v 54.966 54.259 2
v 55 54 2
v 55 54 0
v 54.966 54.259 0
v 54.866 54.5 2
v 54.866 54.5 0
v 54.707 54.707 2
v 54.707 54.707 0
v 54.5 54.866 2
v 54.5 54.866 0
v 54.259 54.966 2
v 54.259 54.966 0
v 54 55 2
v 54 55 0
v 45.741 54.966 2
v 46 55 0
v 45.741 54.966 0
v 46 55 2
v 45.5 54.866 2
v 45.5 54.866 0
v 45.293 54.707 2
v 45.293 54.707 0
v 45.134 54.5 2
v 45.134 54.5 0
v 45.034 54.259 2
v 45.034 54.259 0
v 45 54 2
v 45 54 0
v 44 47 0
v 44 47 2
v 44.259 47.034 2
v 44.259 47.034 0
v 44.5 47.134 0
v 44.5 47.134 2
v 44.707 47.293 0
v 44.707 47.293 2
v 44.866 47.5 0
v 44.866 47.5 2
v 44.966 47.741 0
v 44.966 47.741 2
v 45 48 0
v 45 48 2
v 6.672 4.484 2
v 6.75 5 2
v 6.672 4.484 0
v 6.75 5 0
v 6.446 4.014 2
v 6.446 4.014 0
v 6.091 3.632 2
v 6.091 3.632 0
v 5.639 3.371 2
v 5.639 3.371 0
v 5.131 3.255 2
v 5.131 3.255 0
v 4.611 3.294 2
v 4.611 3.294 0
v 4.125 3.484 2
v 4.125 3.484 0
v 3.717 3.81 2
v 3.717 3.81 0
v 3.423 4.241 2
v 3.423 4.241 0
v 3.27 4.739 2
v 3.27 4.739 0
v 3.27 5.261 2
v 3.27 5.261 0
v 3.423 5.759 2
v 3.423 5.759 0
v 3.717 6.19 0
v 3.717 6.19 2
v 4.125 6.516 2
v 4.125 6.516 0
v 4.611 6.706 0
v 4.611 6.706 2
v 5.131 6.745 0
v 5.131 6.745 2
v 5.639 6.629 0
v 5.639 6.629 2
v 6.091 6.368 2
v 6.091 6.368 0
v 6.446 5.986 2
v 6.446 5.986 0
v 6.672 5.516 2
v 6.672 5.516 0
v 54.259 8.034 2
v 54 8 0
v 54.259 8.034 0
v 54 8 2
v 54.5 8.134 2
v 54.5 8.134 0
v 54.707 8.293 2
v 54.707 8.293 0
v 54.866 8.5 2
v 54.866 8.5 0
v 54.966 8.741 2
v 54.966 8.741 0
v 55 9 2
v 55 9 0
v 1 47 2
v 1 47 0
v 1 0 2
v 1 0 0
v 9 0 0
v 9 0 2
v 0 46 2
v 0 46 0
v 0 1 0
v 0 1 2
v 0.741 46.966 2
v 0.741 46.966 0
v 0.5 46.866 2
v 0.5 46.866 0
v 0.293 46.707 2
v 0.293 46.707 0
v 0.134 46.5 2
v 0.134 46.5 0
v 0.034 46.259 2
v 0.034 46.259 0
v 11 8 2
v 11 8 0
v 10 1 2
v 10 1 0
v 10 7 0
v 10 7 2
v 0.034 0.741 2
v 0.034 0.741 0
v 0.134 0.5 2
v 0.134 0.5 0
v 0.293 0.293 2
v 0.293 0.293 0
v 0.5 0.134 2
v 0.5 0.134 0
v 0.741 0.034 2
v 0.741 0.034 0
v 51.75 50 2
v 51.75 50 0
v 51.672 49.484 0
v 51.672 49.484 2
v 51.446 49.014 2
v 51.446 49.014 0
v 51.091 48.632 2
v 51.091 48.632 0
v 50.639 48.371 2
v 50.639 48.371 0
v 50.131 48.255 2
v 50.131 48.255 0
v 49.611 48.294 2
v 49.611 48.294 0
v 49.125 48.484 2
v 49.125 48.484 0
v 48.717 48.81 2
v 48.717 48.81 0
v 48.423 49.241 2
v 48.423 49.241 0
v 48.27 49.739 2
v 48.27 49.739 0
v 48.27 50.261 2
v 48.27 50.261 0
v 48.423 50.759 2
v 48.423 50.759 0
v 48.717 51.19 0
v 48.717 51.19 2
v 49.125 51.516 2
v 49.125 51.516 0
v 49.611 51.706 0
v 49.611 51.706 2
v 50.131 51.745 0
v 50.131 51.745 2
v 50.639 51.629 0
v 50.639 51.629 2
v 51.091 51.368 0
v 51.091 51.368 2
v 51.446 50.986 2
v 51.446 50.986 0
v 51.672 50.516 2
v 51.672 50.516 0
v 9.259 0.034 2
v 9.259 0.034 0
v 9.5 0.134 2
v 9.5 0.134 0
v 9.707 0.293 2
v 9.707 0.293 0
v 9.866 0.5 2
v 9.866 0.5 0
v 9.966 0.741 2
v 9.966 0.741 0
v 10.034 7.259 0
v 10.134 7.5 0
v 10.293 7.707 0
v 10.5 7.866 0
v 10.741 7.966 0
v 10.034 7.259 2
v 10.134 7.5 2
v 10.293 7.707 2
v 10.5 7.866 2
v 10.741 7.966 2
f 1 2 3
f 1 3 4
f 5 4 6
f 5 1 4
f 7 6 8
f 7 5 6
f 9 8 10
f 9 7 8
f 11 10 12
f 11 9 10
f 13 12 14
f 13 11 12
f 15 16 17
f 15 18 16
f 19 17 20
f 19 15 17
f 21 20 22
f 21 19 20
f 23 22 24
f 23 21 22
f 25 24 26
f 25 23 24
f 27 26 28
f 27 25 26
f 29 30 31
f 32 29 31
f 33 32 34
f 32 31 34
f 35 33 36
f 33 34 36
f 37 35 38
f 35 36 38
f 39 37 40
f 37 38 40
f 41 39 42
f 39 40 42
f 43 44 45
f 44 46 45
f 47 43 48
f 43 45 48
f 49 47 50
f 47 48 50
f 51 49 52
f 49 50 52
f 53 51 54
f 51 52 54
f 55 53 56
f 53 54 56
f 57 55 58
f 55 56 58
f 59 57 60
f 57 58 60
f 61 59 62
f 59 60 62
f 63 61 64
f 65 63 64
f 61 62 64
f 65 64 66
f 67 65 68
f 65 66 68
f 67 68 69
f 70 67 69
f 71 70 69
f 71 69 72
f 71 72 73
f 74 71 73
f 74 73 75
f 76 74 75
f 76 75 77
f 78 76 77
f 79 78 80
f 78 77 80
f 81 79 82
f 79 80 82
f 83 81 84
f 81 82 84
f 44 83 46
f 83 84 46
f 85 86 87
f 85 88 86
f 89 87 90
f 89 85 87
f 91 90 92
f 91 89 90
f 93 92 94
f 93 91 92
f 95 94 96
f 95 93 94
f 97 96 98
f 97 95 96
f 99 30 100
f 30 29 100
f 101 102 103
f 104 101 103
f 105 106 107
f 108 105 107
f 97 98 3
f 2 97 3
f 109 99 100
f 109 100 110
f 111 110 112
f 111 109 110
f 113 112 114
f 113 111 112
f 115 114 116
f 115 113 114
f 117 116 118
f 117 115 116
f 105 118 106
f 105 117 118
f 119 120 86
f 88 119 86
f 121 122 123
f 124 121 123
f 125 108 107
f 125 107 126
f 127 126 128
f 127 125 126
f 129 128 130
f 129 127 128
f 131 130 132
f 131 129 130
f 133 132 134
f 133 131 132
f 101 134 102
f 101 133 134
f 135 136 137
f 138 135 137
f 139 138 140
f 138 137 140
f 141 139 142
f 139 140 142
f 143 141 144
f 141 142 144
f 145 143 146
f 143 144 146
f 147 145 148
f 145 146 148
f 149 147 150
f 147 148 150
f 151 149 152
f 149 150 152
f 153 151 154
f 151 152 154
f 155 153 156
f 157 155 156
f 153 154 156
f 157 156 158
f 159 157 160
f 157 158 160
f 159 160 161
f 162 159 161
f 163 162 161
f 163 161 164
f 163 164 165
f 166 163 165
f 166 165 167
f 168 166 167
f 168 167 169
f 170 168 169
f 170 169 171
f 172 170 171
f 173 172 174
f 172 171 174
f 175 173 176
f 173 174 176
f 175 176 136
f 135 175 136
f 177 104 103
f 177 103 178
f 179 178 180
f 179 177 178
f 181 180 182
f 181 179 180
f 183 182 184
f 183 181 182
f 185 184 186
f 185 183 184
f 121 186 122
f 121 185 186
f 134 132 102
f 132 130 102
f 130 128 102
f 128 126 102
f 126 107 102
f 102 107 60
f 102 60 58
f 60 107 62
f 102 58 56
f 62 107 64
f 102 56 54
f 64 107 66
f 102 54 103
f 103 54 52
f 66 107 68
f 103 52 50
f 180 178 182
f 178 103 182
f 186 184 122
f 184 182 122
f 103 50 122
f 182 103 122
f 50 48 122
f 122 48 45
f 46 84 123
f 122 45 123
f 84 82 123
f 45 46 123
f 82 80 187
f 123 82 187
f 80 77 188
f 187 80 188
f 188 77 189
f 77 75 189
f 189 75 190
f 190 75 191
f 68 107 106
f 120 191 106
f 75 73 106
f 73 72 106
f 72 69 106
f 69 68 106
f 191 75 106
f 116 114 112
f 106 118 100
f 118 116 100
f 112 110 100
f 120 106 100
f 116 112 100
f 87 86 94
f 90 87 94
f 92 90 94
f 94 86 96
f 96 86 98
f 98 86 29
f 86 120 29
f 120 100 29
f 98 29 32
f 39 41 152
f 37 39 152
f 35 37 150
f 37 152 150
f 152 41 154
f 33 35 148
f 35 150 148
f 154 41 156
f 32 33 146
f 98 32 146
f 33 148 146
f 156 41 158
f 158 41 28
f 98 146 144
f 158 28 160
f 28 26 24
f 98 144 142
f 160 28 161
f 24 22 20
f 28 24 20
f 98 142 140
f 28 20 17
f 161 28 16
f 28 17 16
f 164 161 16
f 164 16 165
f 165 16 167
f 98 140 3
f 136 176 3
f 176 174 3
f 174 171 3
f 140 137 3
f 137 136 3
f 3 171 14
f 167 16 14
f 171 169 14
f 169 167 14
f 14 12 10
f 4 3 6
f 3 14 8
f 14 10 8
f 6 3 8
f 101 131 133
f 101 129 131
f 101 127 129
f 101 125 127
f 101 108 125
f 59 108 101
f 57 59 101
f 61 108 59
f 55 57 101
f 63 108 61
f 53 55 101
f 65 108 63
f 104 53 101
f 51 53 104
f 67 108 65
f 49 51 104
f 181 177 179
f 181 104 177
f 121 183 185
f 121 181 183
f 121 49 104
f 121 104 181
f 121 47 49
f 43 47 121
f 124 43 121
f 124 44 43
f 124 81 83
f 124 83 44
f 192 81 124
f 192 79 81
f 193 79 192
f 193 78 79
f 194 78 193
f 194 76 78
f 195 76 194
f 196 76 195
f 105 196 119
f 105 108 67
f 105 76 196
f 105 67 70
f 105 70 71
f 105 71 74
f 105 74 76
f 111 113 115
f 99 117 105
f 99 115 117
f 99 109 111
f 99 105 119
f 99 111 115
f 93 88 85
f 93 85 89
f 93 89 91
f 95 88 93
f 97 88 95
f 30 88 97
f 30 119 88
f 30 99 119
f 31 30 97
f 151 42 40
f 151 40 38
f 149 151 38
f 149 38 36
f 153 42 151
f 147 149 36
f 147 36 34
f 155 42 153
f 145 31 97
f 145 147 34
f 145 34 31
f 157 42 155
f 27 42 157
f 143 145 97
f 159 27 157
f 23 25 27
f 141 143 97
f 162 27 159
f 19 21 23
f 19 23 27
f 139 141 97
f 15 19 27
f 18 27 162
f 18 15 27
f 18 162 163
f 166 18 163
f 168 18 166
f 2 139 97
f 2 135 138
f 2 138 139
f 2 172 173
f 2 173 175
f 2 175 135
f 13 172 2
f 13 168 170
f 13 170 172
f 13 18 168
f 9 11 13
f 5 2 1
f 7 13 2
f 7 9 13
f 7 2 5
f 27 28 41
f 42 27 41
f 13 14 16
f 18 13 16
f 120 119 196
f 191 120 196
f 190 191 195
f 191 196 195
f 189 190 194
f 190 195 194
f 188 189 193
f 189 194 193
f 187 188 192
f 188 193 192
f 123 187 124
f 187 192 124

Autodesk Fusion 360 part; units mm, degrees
sketch "Sketch1" plane through (0, 0, 0) normal (0, 0, 1) x (1, 0, 0)
  line L0 (0, 0) -> (55, 0)
  line L1 (55, 0) -> (55, 55)
  line L2 (55, 55) -> (0, 55)
  line L3 (0, 55) -> (0, 0)
  line L4 (55, 55) -> (45, 55)
  line L5 (45, 55) -> (45, 47)
  line L6 (45, 47) -> (55, 47)
  line L7 (55, 47) -> (55, 55)
  line L8 (0, 0) -> (10, 0)
  line L9 (10, 0) -> (10, 8)
  line L10 (10, 8) -> (0, 8)
  line L11 (0, 8) -> (0, 0)
  line L12 (0, 8) -> (55, 8)
  line L13 (55, 8) -> (55, 47)
  line L14 (55, 47) -> (0, 47)
  line L15 (0, 47) -> (0, 8)
  circle A0 centre (5, 5) radius 1.75
  circle A1 centre (50, 50) radius 1.75
  line L16 (0, 10) -> (55, 10)
  line L17 (55, 10) -> (55, 45)
  line L18 (55, 45) -> (0, 45)
  line L19 (0, 45) -> (0, 10)
  dimension "d1" = 55
  dimension "d7" = 3.5
  dimension "d8" = 3.5
  dimension "d9" = 5
  dimension "d11" = 5
  dimension "d47" = 39
  dimension "d48" = 55
  dimension "d49" = 35
  dimension "d50" = 2
  dimension "d53" = 5
  dimension "d54" = 5
  dimension "d55" = 8
  dimension "d56" = 8
  dimension "d57" = 10
  dimension "d58" = 10
extrude "Extrude1" add sketch "Sketch1" along normal blind 2 contours L0 L3 L8 L9 L10 L11 L12 | L1 L3 L10 L12 L13 L15 L16 | L1 L3 L13 L15 L16 L17 L18 L19 | L1 L3 L6 L13 L14 L15 L18 | L1 L2 L4 L5 L6 L7 L14
sketch "Sketch2" plane through (0, 0, 2) normal (0, 0, 1) x (-1, 0, 0)
  circle A0 centre (-50, -50) radius 1.75
  circle A1 centre (-5, -5) radius 1.75
  line L0 (0, -47) -> (0, 0)
  line L1 (0, 0) -> (-10, 0)
  line L2 (-10, 0) -> (-10, -8)
  line L3 (-10, -8) -> (-55, -8)
  line L4 (-55, -8) -> (-55, -55)
  line L5 (-55, -55) -> (-45, -55)
  line L6 (-45, -55) -> (-45, -47)
  line L7 (-45, -47) -> (0, -47)
  circle A2 centre (-5, -5) radius 1.875
  circle A3 centre (-50, -50) radius 1.875
  line L8 (-4.0912, -23.3213) -> (-51.331, -24.5146) construction
  line L9 (-51.331, -24.5146) -> (-51.1199, -32.872) construction
  line L10 (-51.1199, -32.872) -> (-3.8801, -31.6787) construction
  line L11 (-3.8801, -31.6787) -> (-4.0912, -23.3213) construction
  line L12 (0, -47) -> (0, -8)
  line L13 (0, -8) -> (-55, -8)
  dimension "d15" = 3.75
  dimension "d40" = 5
  dimension "d41" = 27.5
  dimension "d42" = 19.5
hole "Hole1" at (50, 50, 2) direction (0, 0, -1) diameter 3.5 depth 2 tip angle 118
hole "Hole2" at (5, 5, 2) direction (0, 0, -1) diameter 3.5 depth 2 tip angle 118
fillet "Fillet1" radius 1 1 edges at (0, 47, 1)
fillet "Fillet2" radius 1 1 edges at (45, 55, 1)
fillet "Fillet3" radius 1 1 edges at (45, 47, 1)
fillet "Fillet4" radius 1 1 edges at (55, 55, 1)
fillet "Fillet5" radius 1 2 edges at (0, 0, 1) (10, 0, 1)
fillet "Fillet6" radius 1 1 edges at (10, 8, 1)
fillet "Fillet7" radius 1 1 edges at (55, 8, 1)
emboss "Emboss1" [suppressed]
